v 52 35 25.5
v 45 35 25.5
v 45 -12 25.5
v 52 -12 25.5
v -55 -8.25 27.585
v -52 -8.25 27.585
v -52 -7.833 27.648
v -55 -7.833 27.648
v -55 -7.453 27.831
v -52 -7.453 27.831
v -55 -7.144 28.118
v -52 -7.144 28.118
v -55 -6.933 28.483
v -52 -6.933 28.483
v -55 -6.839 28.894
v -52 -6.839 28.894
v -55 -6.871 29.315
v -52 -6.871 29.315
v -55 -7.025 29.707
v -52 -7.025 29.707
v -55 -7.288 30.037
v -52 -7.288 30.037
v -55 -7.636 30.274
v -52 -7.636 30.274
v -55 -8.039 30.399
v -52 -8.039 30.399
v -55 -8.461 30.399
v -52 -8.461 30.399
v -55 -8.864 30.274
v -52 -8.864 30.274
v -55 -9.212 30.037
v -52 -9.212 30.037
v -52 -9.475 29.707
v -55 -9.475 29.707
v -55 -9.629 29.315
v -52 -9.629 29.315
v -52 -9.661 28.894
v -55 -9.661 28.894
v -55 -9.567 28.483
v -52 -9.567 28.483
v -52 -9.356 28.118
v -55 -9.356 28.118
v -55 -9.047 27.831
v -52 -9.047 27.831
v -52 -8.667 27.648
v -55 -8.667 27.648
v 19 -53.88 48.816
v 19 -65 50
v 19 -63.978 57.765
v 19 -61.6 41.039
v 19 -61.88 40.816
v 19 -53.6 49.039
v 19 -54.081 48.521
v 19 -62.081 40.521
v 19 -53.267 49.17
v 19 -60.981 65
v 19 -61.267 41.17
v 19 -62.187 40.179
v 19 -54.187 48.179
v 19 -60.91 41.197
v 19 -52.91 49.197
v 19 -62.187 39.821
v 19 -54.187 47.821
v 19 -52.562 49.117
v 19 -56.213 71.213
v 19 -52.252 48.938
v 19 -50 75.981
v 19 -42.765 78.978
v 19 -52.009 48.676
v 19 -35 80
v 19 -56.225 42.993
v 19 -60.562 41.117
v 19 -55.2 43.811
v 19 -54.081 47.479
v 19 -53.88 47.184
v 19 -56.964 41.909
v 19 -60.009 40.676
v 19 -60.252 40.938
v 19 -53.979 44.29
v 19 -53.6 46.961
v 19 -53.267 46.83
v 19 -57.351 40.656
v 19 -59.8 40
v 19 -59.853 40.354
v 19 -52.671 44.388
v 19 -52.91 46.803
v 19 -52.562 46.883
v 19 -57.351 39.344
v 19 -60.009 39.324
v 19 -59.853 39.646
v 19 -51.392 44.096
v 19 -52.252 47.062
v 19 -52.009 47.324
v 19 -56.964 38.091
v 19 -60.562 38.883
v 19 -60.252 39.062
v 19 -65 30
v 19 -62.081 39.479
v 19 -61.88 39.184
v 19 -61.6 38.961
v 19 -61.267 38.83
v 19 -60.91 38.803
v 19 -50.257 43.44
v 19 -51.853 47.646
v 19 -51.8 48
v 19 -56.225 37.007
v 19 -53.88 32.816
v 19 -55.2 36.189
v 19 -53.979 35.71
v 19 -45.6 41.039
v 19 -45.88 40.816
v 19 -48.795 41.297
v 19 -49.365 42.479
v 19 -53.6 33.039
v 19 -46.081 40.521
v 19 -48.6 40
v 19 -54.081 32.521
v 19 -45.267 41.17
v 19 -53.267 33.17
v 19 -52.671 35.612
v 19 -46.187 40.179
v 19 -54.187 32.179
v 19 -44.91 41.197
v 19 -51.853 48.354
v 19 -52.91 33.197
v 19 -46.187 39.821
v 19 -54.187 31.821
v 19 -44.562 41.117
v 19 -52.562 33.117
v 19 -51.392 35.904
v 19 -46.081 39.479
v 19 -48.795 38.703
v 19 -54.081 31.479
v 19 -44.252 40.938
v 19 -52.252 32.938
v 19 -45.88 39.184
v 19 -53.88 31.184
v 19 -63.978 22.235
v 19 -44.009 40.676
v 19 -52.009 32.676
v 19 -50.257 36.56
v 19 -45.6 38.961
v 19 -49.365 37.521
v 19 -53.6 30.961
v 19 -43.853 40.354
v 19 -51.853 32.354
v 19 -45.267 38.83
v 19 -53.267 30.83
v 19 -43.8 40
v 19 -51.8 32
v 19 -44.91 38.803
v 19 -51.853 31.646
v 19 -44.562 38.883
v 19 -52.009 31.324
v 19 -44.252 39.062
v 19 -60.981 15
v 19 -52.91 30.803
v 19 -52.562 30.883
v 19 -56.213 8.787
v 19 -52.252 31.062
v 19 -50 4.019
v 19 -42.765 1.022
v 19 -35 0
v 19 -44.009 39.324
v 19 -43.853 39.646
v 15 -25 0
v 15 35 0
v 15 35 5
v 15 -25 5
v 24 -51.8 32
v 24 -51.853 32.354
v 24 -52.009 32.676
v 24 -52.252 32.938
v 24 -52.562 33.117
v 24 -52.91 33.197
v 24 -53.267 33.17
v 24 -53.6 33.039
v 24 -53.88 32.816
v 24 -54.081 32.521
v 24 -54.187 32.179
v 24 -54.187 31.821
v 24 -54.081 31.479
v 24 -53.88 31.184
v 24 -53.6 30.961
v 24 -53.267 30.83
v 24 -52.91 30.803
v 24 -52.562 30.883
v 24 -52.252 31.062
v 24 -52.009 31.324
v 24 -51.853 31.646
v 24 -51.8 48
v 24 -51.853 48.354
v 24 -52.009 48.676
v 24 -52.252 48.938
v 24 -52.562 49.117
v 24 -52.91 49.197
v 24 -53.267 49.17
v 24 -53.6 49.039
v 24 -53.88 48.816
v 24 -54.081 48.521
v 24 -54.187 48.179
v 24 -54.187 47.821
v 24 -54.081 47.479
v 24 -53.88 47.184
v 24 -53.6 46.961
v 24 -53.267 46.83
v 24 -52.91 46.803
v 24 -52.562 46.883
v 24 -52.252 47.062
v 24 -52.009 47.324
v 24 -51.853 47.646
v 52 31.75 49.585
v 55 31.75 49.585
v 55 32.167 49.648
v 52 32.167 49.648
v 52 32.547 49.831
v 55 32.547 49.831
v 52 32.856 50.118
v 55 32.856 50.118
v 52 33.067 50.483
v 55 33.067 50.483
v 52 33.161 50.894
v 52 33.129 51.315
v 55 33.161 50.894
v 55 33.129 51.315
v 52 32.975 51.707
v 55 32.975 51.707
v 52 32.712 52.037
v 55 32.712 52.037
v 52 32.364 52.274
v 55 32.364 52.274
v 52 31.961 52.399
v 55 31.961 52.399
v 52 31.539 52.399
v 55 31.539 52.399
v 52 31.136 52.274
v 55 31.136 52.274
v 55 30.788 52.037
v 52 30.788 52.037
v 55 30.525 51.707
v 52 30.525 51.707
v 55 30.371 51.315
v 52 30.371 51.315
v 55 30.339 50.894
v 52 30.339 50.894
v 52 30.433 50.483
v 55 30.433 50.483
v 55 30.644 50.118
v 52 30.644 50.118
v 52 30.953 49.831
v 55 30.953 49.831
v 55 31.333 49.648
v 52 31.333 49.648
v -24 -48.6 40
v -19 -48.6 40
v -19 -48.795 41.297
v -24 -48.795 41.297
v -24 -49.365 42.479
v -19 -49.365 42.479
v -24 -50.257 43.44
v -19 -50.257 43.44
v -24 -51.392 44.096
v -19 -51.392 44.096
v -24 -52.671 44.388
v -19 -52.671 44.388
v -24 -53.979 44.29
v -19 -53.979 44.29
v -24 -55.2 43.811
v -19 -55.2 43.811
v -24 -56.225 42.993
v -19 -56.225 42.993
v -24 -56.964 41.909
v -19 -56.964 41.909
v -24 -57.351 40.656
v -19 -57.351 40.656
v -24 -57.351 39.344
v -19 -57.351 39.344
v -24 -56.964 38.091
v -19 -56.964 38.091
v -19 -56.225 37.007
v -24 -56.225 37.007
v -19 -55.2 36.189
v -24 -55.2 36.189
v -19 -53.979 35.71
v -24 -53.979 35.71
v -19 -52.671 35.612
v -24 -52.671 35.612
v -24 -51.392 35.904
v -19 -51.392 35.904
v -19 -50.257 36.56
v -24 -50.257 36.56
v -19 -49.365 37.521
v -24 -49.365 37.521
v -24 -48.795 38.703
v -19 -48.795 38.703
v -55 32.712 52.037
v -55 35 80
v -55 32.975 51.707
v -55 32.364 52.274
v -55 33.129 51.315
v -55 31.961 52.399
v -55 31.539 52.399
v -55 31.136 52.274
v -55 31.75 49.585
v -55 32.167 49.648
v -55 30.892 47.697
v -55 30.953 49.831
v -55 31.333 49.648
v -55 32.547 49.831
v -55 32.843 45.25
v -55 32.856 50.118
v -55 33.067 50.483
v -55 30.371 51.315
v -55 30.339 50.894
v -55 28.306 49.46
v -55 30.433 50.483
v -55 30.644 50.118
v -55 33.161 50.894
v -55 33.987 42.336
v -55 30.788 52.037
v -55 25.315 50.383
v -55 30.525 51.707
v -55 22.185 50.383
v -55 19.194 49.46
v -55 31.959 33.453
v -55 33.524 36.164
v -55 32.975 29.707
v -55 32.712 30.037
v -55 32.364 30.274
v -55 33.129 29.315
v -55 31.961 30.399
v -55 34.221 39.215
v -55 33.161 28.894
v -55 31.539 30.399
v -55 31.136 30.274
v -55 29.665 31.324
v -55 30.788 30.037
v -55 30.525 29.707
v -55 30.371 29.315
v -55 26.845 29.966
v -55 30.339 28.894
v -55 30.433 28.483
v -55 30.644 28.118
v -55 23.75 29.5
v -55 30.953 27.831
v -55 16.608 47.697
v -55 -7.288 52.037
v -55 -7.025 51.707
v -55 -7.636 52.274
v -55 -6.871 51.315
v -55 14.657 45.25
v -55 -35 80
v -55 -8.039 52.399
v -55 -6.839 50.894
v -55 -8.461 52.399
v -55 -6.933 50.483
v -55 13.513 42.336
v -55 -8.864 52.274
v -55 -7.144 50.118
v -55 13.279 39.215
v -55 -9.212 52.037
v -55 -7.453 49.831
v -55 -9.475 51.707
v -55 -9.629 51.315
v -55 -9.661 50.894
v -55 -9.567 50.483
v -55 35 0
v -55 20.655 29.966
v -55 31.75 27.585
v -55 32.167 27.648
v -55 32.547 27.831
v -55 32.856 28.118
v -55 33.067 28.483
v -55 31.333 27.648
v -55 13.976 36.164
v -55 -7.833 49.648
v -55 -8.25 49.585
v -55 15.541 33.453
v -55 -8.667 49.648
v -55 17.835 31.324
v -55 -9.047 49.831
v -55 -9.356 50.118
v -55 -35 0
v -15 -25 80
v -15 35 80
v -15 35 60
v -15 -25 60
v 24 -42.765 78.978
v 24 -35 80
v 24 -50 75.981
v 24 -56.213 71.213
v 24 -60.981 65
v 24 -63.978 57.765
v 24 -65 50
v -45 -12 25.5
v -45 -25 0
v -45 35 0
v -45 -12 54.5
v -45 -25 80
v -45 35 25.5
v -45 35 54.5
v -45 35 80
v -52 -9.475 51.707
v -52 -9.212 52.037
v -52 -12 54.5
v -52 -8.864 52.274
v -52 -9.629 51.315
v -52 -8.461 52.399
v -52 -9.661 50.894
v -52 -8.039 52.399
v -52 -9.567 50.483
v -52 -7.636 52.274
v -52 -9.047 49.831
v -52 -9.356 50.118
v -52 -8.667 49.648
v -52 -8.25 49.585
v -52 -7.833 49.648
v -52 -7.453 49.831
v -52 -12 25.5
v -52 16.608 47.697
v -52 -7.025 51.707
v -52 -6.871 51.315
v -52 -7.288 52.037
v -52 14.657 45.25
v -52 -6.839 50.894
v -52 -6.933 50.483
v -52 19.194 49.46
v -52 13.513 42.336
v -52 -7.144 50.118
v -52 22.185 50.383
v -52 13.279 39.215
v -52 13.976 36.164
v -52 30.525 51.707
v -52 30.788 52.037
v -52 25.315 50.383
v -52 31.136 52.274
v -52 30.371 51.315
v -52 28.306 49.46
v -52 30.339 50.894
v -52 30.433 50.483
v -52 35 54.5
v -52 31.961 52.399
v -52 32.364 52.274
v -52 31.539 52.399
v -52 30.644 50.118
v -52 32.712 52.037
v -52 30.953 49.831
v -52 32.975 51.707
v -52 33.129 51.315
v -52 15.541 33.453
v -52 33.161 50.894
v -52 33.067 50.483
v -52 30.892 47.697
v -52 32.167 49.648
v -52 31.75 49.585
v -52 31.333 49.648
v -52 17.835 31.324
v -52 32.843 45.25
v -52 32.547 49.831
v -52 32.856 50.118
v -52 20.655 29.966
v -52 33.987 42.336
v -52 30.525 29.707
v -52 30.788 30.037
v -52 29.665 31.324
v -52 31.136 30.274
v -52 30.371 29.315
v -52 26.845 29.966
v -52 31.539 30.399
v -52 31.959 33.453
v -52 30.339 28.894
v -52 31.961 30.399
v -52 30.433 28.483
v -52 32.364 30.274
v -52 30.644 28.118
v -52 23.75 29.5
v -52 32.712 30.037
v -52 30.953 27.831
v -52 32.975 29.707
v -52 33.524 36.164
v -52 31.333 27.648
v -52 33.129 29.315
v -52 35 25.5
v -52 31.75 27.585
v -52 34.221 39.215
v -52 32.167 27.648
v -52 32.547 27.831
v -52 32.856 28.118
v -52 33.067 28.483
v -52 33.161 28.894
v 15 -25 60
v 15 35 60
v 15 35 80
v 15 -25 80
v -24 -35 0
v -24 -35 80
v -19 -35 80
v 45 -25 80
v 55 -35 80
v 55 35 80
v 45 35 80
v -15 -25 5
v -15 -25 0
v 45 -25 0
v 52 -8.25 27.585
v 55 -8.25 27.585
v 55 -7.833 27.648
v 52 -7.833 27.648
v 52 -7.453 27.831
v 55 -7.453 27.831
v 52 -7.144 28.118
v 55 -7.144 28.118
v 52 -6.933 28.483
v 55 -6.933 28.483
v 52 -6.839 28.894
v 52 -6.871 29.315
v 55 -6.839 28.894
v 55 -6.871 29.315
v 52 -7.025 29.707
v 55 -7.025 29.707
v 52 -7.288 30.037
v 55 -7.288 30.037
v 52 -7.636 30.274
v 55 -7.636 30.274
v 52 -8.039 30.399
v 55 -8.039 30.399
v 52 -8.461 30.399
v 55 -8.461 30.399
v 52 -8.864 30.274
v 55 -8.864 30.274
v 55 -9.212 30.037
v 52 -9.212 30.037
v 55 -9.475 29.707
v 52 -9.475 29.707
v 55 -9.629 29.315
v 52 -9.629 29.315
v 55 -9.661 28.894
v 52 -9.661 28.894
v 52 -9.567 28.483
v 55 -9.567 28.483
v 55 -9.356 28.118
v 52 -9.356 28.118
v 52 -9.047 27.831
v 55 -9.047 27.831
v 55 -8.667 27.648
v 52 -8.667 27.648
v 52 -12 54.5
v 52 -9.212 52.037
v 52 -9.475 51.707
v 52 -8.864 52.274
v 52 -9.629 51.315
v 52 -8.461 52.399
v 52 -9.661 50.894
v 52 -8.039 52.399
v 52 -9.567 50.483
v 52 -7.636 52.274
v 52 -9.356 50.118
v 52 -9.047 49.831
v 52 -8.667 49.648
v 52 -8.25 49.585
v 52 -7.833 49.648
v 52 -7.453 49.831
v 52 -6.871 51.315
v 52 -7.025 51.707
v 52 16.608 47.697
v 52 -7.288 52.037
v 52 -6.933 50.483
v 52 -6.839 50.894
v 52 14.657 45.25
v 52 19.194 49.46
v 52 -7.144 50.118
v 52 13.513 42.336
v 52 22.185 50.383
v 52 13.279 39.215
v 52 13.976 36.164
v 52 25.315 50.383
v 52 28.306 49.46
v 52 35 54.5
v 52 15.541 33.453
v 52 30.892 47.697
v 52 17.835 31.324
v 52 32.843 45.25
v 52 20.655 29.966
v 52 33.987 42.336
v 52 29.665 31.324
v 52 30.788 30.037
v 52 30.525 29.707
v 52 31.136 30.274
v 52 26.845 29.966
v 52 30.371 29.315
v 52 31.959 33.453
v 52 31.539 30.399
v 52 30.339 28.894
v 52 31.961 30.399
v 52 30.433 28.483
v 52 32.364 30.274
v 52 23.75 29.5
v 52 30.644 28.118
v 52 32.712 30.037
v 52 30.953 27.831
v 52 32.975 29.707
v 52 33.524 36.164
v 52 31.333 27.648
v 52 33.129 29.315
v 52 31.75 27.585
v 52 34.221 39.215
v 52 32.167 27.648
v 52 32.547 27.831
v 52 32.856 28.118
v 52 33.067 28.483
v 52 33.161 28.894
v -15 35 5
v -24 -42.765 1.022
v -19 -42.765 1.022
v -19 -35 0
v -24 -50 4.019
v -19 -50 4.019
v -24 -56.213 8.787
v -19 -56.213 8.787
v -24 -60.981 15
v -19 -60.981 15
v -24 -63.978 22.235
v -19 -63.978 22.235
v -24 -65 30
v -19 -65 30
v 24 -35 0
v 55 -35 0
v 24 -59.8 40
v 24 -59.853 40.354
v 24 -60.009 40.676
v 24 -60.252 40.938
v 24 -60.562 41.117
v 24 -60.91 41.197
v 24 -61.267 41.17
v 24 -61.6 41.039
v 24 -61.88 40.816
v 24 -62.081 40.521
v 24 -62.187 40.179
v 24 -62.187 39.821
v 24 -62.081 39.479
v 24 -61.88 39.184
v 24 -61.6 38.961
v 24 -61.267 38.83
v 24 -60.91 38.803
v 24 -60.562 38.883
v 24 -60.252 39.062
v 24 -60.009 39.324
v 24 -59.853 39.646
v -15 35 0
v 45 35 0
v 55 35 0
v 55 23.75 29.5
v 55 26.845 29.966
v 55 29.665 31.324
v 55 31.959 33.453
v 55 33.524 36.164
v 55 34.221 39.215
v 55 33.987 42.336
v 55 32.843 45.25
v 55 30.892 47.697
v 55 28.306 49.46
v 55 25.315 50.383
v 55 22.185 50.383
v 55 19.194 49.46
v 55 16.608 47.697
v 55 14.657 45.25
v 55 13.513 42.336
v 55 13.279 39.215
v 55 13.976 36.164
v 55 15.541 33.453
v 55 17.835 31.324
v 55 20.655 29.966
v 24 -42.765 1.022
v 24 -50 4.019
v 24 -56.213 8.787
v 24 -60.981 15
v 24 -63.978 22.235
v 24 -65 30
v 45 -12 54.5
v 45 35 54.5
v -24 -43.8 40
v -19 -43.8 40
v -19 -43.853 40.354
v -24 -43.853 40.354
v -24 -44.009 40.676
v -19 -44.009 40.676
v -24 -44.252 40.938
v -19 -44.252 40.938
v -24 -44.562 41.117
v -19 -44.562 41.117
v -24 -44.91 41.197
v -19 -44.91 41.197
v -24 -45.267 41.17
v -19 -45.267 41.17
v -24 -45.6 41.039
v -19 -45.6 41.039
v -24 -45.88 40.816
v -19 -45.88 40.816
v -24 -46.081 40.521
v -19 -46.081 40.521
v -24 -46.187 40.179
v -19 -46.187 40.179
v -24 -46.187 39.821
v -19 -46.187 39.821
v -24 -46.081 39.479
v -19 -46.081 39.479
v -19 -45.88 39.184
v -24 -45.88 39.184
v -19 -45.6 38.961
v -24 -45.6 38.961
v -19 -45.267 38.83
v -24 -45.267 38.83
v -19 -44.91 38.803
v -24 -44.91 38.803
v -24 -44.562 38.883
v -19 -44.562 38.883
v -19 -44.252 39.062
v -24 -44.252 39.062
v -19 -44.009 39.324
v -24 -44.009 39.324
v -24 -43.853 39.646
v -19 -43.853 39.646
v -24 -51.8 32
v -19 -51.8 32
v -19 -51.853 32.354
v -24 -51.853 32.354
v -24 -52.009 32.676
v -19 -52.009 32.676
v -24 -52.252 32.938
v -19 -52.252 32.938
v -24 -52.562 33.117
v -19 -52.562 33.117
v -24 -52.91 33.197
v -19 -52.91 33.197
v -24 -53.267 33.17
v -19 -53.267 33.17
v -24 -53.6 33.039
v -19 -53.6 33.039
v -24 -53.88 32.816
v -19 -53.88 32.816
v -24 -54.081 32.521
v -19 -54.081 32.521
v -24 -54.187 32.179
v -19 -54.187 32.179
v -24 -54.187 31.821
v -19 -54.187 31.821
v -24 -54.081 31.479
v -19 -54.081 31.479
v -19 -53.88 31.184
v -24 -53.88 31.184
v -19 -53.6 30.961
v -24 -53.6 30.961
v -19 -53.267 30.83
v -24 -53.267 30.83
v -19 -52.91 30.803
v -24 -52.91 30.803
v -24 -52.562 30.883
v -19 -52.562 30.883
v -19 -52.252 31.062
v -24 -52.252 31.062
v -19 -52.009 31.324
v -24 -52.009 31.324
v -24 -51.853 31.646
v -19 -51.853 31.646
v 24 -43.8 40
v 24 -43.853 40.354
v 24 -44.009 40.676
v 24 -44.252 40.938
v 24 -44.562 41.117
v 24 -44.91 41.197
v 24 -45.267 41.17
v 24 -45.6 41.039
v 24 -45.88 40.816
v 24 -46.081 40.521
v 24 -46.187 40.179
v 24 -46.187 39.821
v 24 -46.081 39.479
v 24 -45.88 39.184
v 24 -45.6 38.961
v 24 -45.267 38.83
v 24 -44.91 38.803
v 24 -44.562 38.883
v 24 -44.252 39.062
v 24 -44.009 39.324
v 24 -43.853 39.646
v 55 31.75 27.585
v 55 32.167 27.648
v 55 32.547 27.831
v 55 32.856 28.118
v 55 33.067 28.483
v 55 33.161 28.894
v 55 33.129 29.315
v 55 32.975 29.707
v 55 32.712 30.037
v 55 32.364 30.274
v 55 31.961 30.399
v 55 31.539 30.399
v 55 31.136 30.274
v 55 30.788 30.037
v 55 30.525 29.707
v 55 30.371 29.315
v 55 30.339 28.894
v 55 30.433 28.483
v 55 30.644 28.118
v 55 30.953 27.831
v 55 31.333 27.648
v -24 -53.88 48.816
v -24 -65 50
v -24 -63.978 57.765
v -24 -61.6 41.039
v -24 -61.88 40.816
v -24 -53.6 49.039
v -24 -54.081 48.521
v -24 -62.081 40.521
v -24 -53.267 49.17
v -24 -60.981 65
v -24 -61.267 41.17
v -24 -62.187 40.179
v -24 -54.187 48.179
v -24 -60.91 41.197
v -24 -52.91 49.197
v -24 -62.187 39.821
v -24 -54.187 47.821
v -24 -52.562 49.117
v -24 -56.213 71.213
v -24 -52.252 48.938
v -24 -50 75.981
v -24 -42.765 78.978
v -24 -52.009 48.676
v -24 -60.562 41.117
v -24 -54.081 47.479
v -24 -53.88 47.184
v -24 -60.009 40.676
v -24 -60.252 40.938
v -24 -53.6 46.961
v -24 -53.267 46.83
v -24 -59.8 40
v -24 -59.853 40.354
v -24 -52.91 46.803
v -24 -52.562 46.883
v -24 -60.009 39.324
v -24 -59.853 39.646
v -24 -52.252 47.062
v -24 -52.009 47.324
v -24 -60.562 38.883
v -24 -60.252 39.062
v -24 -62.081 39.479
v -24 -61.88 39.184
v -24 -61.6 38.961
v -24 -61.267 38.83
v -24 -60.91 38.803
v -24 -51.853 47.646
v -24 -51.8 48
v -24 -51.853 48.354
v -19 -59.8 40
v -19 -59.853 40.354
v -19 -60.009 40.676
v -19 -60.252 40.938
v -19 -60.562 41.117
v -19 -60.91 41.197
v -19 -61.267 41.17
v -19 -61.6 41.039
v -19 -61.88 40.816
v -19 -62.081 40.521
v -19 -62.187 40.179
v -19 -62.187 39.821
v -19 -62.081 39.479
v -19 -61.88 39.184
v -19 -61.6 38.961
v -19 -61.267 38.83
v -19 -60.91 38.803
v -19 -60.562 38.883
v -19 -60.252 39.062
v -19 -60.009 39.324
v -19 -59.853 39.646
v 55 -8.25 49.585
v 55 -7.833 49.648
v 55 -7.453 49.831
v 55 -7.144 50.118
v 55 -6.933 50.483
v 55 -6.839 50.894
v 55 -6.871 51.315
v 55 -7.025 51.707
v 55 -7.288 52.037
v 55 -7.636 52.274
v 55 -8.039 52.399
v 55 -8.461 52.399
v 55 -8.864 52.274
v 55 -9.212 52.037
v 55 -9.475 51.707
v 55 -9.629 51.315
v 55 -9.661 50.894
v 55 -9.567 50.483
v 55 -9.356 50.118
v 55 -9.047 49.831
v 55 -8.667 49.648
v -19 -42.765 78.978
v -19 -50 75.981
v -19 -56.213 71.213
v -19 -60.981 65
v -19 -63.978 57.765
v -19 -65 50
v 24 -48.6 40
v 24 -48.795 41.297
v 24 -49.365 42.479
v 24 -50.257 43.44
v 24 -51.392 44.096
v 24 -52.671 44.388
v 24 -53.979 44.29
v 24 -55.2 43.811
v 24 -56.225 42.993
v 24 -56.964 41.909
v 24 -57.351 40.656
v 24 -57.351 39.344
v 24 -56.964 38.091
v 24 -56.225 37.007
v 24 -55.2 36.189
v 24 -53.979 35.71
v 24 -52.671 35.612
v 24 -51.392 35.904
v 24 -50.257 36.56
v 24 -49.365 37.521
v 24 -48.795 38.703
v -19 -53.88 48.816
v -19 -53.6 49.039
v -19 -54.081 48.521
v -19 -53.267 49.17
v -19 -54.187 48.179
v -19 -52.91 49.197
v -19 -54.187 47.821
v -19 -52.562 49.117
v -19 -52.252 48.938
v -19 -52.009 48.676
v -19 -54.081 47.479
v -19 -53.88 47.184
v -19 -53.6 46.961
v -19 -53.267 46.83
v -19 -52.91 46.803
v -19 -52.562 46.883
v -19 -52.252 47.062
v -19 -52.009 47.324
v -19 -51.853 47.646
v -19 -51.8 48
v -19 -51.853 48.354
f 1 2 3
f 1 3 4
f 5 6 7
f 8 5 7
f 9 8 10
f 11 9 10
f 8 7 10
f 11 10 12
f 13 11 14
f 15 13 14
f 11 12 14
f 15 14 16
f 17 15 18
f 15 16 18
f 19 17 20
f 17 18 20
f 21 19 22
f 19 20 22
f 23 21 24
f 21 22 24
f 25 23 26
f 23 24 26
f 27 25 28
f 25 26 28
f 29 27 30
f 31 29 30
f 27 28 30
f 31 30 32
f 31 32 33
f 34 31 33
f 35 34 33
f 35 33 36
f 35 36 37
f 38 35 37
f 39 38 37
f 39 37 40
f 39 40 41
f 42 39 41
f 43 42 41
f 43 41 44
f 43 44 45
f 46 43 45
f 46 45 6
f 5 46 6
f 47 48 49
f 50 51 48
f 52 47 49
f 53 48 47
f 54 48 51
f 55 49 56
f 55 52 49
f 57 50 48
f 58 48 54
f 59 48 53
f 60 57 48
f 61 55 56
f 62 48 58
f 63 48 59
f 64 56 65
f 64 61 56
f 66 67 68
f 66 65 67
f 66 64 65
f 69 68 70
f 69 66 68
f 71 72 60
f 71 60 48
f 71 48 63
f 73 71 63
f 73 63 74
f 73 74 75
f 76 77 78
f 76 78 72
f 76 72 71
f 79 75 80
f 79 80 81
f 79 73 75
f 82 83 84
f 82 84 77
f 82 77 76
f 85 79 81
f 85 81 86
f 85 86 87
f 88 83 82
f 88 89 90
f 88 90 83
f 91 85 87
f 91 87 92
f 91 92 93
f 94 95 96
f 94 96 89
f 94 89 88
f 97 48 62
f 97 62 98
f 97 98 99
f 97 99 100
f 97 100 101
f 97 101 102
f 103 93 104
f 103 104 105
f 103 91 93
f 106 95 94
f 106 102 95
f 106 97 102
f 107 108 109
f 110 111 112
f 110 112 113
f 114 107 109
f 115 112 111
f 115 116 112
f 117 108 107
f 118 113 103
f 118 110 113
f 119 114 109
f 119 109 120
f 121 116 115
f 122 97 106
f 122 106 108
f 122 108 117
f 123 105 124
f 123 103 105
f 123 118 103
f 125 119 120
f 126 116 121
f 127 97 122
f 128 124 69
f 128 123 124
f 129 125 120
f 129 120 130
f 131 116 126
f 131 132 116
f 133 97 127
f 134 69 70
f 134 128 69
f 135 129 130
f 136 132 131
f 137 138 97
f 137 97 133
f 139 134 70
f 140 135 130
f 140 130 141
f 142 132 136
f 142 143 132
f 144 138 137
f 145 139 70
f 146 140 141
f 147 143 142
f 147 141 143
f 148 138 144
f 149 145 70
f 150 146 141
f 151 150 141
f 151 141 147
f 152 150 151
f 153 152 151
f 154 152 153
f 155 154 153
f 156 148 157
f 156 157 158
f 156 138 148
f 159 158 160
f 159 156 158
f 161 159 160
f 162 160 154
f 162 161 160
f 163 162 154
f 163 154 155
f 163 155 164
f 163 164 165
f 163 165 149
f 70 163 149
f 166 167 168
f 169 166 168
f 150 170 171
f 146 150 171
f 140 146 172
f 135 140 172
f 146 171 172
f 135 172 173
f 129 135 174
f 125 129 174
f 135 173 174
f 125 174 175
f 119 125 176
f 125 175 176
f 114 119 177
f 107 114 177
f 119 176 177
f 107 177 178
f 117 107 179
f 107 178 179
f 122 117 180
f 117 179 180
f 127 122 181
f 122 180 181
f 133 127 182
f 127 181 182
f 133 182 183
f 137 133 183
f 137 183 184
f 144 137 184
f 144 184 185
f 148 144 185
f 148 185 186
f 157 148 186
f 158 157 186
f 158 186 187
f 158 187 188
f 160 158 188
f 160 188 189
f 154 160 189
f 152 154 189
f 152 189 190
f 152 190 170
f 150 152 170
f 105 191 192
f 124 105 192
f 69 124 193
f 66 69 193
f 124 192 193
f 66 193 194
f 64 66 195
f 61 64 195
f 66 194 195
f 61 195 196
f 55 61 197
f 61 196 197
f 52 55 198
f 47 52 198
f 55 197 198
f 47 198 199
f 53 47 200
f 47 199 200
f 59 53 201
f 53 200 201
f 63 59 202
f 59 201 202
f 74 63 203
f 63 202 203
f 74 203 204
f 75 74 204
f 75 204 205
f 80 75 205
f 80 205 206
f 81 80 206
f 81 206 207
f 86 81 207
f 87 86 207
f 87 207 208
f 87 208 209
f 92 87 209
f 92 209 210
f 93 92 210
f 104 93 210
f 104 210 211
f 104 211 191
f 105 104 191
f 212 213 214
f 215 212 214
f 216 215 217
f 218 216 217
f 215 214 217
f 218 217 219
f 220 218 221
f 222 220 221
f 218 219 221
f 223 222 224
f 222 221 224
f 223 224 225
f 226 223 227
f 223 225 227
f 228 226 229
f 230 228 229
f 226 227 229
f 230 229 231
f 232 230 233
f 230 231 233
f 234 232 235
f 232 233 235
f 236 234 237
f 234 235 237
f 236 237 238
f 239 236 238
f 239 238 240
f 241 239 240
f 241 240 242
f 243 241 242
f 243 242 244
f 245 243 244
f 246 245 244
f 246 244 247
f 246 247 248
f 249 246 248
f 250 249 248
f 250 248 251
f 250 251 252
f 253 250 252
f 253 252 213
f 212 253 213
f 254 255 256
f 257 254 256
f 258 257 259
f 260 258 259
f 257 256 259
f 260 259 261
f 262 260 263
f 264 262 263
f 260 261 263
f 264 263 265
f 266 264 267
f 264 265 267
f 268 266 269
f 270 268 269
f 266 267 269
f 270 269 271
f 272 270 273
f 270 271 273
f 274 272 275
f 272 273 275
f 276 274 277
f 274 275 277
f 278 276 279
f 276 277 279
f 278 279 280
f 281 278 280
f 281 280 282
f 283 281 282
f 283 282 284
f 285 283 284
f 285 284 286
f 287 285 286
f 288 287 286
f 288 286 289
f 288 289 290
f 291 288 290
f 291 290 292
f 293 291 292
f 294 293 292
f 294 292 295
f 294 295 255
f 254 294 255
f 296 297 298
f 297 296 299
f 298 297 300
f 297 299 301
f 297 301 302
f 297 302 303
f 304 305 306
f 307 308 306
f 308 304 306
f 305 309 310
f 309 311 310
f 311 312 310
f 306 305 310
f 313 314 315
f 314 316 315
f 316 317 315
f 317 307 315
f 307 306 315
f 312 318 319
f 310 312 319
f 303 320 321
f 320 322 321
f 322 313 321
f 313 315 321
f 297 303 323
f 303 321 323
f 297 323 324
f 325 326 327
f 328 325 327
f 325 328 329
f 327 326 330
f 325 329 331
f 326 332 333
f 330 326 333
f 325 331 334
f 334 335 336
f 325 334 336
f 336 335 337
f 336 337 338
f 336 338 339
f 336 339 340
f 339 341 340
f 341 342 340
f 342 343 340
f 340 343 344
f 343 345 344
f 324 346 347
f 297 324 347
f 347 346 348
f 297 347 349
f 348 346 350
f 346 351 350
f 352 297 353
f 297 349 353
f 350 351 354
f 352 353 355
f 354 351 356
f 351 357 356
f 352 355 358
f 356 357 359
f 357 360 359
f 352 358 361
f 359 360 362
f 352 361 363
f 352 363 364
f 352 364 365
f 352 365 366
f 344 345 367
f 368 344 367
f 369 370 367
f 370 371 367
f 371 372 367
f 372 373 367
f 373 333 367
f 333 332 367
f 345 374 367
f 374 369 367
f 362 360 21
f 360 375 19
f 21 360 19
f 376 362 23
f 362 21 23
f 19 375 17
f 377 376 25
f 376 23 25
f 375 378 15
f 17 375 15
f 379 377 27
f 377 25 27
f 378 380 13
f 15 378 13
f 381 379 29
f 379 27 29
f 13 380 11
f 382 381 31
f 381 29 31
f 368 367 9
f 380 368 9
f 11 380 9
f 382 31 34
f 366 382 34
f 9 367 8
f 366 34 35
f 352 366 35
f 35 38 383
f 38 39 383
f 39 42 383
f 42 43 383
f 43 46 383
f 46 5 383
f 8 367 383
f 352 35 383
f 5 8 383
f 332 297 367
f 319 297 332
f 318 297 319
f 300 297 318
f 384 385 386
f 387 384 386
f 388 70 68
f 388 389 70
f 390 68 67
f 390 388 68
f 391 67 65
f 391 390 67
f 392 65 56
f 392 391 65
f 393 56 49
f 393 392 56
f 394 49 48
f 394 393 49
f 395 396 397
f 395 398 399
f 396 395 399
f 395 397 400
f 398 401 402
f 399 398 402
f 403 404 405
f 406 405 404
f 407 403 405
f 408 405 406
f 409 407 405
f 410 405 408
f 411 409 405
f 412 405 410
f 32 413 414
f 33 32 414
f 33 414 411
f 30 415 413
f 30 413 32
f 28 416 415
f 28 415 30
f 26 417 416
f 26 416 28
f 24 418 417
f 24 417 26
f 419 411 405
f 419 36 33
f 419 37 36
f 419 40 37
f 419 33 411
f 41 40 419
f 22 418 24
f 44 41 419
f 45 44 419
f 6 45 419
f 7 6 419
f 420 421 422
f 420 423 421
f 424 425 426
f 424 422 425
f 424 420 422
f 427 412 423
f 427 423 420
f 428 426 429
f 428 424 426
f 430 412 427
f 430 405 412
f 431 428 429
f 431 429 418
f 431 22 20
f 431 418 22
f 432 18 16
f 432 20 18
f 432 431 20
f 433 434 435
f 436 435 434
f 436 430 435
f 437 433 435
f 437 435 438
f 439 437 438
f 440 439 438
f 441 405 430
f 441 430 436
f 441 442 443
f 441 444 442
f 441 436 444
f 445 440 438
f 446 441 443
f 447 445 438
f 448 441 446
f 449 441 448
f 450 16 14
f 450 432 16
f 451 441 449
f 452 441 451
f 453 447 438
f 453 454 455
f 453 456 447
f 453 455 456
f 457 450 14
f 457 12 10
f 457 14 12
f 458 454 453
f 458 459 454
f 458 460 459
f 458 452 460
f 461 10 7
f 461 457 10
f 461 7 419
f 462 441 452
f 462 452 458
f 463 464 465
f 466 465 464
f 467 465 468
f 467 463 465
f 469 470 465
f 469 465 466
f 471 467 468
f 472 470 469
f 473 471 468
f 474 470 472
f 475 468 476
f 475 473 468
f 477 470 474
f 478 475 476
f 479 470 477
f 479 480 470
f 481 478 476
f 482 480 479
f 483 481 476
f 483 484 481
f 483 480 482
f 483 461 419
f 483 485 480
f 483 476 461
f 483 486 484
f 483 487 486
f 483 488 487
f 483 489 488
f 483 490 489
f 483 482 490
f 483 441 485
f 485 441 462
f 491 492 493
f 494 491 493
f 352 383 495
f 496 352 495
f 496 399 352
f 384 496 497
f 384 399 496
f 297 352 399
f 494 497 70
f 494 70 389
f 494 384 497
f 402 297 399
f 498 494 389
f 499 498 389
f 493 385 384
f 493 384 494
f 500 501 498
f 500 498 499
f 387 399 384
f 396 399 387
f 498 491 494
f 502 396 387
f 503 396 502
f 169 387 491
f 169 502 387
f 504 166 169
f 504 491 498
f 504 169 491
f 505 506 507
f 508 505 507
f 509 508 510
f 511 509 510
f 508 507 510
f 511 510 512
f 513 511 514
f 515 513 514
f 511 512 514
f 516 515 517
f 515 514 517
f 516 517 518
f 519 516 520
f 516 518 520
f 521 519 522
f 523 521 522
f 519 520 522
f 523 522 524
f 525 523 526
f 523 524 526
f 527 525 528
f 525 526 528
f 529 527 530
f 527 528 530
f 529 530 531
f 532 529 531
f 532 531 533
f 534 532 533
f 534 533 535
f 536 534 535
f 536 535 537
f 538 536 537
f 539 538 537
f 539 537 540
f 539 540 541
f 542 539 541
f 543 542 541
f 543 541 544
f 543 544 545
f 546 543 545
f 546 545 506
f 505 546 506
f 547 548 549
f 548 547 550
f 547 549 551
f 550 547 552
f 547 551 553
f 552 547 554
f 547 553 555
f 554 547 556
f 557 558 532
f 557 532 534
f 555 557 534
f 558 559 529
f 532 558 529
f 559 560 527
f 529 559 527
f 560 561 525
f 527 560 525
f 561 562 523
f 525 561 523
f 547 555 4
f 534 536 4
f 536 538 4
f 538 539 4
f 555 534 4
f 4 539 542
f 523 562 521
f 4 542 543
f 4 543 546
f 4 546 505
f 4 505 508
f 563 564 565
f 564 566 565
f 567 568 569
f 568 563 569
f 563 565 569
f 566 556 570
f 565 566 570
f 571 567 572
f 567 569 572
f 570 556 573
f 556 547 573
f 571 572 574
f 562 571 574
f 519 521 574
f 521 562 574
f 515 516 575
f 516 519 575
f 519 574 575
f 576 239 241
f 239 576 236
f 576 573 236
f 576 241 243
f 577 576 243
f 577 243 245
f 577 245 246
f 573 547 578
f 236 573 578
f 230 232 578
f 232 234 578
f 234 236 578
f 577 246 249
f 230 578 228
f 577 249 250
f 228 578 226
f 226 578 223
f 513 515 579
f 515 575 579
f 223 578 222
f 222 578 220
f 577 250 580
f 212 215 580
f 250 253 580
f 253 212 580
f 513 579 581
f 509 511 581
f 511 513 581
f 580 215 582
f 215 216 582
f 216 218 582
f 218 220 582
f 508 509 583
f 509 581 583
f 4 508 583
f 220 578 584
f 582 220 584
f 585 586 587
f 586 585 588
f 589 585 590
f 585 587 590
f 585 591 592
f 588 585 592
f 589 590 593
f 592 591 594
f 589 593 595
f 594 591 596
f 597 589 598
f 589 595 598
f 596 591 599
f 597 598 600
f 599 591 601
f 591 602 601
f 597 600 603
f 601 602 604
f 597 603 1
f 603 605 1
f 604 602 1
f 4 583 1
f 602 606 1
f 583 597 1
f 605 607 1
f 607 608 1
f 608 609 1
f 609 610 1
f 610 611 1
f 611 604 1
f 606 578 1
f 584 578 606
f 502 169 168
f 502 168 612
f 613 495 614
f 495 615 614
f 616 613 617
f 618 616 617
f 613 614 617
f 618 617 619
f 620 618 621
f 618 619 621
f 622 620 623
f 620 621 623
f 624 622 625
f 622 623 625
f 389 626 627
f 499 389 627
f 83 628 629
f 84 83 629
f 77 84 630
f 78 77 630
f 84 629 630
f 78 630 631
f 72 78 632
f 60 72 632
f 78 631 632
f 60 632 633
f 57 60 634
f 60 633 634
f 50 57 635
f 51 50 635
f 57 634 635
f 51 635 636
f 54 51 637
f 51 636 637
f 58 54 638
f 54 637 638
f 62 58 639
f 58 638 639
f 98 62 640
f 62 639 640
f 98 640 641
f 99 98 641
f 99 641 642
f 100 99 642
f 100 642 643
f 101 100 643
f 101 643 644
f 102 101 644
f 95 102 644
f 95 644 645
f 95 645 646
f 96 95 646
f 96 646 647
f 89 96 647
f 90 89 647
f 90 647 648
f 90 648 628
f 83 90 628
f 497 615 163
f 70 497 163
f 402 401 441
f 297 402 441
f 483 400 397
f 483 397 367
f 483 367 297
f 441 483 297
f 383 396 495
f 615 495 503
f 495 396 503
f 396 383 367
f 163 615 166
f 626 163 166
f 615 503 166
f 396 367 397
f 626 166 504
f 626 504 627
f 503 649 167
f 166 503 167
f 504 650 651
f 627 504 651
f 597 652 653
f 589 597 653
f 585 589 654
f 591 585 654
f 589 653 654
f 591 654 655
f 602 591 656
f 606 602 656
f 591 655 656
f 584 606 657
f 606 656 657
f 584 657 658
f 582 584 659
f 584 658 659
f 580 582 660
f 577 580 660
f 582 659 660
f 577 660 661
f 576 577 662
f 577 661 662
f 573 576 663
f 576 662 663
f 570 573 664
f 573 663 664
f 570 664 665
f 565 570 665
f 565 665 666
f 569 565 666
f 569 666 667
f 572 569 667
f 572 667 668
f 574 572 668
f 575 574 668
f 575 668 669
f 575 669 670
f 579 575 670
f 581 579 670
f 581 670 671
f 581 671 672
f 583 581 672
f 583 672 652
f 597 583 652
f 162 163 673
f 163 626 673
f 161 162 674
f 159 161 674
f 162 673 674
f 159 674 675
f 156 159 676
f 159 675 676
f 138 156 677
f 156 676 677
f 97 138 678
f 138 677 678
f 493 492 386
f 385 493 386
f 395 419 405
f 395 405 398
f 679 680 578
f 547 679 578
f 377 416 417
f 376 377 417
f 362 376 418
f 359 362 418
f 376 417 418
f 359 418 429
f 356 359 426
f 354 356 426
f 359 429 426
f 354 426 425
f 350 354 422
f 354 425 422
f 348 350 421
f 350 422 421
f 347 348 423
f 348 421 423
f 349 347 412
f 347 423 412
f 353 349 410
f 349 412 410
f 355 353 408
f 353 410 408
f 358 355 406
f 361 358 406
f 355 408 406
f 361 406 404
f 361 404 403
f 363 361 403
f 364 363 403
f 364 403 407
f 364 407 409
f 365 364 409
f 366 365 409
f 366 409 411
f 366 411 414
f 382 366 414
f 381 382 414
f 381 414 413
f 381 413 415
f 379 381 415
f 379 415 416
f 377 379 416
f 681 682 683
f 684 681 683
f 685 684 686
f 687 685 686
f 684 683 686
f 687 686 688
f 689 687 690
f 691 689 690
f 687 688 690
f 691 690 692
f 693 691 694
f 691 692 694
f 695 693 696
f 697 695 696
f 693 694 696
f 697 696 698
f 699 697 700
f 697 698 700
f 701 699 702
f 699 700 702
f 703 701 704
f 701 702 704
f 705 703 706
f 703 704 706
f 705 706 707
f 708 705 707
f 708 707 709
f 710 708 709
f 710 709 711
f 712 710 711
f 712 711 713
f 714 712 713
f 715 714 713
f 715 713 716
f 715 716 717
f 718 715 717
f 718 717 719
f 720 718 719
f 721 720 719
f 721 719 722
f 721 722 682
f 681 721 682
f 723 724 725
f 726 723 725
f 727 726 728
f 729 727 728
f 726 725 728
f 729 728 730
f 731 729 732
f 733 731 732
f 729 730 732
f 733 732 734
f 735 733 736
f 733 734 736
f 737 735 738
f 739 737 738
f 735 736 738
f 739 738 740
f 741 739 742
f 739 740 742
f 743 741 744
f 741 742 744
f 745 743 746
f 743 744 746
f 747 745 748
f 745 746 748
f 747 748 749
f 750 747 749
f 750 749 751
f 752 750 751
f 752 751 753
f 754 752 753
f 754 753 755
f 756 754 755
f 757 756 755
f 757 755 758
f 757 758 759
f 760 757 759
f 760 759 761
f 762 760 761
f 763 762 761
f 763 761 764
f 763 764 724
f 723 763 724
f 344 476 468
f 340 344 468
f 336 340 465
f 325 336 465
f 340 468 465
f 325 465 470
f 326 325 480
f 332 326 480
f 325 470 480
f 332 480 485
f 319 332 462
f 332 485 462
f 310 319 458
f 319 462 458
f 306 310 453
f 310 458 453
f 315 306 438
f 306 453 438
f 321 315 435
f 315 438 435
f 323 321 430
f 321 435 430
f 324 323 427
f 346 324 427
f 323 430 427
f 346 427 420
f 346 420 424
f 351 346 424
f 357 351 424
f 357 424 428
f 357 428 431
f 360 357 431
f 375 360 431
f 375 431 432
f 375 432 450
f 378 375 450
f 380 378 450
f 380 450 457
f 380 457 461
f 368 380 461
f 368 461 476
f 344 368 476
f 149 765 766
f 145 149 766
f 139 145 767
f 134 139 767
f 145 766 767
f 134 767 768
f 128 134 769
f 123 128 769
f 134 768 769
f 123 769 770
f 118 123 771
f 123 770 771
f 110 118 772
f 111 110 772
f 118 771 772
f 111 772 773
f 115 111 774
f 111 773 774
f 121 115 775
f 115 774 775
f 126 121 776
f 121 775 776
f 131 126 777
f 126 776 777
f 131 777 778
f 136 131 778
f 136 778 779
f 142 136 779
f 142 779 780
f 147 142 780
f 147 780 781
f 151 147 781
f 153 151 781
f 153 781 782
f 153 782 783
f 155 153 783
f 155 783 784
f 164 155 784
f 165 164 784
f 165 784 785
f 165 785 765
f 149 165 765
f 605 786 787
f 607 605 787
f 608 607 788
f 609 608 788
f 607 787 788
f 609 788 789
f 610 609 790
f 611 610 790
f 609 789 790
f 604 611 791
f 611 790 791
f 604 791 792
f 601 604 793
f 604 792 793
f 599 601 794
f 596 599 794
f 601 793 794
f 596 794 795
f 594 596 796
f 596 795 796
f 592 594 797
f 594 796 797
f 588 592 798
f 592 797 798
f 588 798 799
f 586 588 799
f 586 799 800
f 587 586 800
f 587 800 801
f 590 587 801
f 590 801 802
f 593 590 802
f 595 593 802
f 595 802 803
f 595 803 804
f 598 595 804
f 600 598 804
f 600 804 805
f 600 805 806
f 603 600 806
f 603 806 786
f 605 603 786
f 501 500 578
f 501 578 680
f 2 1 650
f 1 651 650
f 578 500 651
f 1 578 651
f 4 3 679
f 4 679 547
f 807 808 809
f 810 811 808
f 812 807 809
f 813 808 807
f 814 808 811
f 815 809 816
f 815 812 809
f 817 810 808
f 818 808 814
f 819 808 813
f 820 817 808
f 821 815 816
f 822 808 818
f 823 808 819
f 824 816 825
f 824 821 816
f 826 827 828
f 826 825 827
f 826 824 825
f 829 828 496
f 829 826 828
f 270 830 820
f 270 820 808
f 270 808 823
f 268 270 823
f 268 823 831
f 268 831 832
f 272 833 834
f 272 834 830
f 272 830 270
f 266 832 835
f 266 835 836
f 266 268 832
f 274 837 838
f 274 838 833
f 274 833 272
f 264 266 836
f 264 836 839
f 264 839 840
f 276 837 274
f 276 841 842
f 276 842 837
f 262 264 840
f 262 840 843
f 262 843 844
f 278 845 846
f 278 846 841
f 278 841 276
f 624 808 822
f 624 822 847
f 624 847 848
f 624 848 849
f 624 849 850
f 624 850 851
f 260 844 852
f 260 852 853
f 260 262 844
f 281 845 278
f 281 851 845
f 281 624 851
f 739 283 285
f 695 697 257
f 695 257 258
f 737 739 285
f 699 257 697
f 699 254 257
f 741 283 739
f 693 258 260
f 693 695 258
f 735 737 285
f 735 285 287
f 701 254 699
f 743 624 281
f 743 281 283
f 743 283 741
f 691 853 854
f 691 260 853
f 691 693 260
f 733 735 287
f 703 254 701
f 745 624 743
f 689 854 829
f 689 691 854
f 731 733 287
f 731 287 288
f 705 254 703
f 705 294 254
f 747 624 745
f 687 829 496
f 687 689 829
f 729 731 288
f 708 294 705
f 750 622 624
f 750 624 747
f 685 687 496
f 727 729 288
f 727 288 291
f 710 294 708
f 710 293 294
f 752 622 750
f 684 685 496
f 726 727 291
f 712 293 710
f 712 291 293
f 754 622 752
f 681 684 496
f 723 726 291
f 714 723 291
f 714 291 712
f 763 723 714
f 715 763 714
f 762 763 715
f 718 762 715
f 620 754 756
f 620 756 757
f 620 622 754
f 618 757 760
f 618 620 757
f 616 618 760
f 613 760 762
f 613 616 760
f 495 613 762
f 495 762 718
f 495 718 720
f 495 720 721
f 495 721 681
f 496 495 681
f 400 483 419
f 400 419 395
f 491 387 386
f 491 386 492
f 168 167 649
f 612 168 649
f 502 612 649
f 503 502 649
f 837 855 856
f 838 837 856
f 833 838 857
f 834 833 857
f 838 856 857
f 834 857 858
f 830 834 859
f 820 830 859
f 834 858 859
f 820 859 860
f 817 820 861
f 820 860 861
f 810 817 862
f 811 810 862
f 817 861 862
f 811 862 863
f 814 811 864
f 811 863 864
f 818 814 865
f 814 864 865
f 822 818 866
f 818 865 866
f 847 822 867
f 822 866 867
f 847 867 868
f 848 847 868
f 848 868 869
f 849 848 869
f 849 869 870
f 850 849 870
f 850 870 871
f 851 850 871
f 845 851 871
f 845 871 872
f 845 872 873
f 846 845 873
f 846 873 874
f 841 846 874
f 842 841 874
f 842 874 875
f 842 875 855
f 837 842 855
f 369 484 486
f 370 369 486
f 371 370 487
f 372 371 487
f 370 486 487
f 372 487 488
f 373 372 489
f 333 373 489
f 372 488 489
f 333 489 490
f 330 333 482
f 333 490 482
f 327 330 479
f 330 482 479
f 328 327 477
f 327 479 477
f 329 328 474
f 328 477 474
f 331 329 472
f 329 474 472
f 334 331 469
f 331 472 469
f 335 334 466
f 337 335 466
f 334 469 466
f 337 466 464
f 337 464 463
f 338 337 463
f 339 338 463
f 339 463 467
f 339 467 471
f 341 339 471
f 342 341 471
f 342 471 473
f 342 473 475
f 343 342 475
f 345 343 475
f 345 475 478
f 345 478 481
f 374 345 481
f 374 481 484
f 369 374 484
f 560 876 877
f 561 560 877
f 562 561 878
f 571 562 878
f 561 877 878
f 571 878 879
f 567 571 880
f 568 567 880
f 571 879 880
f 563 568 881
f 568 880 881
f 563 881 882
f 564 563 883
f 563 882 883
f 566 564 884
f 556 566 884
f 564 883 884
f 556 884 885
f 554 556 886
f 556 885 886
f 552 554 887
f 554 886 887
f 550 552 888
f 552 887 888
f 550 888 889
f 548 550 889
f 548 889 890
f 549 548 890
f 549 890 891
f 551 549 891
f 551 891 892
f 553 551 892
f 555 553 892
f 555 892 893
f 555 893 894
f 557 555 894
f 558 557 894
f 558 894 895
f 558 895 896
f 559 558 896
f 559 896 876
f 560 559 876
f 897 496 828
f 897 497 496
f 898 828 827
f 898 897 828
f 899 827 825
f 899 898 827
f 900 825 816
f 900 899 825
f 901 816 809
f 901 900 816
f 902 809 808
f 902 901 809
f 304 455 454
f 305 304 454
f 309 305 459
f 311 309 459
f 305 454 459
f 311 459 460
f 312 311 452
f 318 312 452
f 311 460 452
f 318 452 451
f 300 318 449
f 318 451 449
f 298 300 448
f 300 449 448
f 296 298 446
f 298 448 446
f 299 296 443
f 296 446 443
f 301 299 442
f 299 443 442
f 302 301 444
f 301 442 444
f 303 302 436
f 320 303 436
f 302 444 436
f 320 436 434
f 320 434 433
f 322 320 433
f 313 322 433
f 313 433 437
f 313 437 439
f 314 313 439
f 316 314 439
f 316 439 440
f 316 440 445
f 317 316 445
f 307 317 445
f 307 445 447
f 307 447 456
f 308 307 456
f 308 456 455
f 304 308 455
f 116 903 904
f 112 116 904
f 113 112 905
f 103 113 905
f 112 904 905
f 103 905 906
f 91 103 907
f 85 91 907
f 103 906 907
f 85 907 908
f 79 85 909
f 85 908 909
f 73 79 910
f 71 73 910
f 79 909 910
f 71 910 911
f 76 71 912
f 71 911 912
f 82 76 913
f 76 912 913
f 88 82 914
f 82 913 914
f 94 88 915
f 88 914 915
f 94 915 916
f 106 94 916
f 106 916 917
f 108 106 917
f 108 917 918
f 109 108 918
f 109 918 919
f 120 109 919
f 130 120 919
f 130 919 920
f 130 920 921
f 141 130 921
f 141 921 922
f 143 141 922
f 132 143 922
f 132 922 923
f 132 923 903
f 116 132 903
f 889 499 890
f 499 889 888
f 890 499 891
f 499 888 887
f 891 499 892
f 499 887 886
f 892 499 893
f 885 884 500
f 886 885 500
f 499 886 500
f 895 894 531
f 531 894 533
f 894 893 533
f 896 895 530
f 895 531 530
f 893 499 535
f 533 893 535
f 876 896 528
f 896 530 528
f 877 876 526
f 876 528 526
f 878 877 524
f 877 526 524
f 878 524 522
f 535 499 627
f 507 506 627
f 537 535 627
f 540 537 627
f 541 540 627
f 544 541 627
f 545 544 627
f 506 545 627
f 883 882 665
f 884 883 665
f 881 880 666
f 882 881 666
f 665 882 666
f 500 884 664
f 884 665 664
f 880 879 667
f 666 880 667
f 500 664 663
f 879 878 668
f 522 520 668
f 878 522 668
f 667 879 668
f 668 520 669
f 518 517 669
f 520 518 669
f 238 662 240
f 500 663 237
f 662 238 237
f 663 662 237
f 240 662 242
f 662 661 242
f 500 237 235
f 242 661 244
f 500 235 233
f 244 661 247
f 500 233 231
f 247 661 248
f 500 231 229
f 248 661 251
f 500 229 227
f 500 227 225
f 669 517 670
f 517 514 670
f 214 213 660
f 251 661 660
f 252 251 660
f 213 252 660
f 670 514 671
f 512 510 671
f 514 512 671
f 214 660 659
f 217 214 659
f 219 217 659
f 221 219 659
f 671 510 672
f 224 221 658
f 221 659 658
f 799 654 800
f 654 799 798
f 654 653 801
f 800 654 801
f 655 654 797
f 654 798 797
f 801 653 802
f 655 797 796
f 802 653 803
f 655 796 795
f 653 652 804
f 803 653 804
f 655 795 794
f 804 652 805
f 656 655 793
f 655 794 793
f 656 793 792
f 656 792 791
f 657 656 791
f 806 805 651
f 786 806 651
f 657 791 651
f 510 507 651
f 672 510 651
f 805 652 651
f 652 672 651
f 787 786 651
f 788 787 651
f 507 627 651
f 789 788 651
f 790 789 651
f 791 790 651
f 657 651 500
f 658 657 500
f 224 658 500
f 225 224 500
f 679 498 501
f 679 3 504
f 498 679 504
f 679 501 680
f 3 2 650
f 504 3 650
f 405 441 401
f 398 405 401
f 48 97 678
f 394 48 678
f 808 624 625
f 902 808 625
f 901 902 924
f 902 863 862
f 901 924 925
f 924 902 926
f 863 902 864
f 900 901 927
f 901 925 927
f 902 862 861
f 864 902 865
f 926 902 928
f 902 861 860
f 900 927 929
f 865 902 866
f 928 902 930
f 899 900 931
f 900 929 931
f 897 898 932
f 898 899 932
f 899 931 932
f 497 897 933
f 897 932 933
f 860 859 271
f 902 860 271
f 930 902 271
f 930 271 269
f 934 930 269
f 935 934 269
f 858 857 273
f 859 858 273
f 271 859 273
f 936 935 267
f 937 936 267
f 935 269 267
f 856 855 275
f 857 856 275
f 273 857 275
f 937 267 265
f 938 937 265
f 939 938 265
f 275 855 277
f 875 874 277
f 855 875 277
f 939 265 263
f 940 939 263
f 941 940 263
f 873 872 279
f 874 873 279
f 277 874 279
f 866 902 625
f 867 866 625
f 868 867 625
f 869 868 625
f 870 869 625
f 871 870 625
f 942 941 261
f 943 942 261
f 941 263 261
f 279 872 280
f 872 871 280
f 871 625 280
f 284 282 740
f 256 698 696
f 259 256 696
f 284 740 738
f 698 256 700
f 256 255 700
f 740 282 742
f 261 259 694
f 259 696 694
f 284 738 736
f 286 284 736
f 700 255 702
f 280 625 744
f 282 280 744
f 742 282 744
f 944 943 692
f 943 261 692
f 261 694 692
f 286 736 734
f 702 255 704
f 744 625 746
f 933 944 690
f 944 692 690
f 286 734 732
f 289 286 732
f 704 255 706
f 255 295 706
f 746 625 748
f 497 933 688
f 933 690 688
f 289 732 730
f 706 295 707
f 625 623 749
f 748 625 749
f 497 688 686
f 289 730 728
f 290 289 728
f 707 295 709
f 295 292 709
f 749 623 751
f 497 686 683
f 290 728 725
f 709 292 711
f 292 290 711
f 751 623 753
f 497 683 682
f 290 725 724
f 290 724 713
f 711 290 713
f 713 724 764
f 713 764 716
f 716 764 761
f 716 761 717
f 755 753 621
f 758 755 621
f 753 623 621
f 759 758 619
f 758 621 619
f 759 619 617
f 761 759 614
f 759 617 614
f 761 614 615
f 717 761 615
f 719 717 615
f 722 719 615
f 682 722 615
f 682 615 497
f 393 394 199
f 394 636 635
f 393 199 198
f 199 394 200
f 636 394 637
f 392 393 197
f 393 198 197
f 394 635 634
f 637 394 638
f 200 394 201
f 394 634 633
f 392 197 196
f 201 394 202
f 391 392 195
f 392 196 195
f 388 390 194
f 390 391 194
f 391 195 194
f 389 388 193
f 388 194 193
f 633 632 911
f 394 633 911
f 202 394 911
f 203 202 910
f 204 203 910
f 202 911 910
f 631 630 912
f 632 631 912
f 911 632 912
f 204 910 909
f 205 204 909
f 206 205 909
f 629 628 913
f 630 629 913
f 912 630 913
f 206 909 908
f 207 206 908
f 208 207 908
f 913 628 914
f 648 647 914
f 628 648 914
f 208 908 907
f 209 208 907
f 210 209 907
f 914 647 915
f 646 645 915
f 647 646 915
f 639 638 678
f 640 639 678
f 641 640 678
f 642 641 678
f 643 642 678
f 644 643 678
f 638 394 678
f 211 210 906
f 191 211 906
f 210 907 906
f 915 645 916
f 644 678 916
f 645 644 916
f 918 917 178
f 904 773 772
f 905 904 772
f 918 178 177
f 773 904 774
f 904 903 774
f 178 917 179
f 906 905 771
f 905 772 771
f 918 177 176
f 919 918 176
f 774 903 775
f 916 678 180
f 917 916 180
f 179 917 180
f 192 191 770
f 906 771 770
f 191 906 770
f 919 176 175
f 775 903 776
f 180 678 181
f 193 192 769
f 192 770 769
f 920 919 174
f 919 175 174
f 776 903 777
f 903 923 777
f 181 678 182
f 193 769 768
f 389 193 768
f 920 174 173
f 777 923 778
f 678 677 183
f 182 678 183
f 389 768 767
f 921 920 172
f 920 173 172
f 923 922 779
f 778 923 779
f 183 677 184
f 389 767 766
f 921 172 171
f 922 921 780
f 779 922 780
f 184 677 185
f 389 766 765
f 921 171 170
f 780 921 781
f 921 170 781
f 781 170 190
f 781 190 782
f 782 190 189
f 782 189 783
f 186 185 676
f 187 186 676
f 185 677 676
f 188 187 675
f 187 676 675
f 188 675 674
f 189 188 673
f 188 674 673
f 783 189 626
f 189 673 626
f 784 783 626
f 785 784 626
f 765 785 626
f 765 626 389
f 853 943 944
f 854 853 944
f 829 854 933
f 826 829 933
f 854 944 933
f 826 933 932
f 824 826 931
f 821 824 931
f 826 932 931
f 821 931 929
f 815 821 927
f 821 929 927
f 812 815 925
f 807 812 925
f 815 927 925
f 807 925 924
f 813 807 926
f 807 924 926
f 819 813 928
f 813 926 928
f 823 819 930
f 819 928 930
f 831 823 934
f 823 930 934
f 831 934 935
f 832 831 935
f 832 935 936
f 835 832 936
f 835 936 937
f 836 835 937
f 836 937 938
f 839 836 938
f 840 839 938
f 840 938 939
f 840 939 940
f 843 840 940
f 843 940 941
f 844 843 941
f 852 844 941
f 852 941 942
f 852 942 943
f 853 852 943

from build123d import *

# Parameters (mm, degrees)
SKETCH1_W           = 5
SKETCH1_H           = 30
BOSS_EXTRUDE1_DEPTH = 80
SKETCH2_R           = 1.2
SKETCH2_R_2         = 4.4
CUT_EXTRUDE1_DEPTH  = 80
CUT_EXTRUDE3_DEPTH  = 60
FILLET1_R           = 30
SKETCH6_R           = 10.5
SKETCH6_R_2         = 1.41450308
CUT_EXTRUDE4_DEPTH  = 151.748134317
SKETCH8_W           = 7
SKETCH8_H           = 29
CUT_EXTRUDE5_DEPTH  = 47


with BuildPart() as part:
    # Sketch1 → Boss-Extrude1 (new body)
    with BuildSketch(Plane.XY):
        Polygon((55, 35), (-55, 35), (-55, -35), (-24, -35), (-19, -35), (19, -35), (24, -35), (55, -35), align=None)
        with Locations((-21.5, -50)):
            Rectangle(SKETCH1_W, SKETCH1_H)
        with Locations((21.5, -50)):
            Rectangle(SKETCH1_W, SKETCH1_H)
    extrude(amount=BOSS_EXTRUDE1_DEPTH)

    # Sketch2 → Cut-Extrude1 (cut)
    with BuildSketch(Plane(origin=(24, 0, 0), x_dir=(0, 0, -1), z_dir=(1, 0, 0))):
        with Locations(Location((-40, -45, 0), (0, 0, 90))):
            Circle(SKETCH2_R)
        with Locations(Location((-32, -53, 0), (0, 0, 90))):
            Circle(SKETCH2_R)
        with Locations(Location((-40, -61, 0), (0, 0, 90))):
            Circle(SKETCH2_R)
        with Locations(Location((-48, -53, 0), (0, 0, 90))):
            Circle(SKETCH2_R)
        with Locations(Location((-40, -53, 0), (0, 0, 90))):
            Circle(SKETCH2_R_2)
    extrude(amount=-CUT_EXTRUDE1_DEPTH, mode=Mode.SUBTRACT)

    # Sketch4 → Cut-Extrude3 (cut)
    with BuildSketch(Plane(origin=(0, 35, 0), x_dir=(1, 0, 0), z_dir=(0, 1, 0))):
        Polygon((-45, 0), (-45, -80), (-15, -80), (-15, -60), (15, -60), (15, -80), (45, -80), (45, 0), (15, 0), (15, -5), (-15, -5), (-15, 0), align=None)
    extrude(amount=-CUT_EXTRUDE3_DEPTH, mode=Mode.SUBTRACT)

    # Fillet1
    fillet1_edges = [part.edges().sort_by_distance(p)[0] for p in [
        (-21.5, -65, 0),
        (-21.5, -65, 80),
        (21.5, -65, 0),
        (21.5, -65, 80),
    ]]
    fillet(fillet1_edges, radius=FILLET1_R)

    # Sketch6 → Cut-Extrude4 (cut, through all)
    with BuildSketch(Plane(origin=(55, 0, 0), x_dir=(0, 0, -1), z_dir=(1, 0, 0))):
        with Locations((-40, 23.75)):
            Circle(SKETCH6_R)
        with Locations((-51, 31.75)):
            Circle(SKETCH6_R_2)
        with Locations((-29, 31.75)):
            Circle(SKETCH6_R_2)
        with Locations((-51, -8.25)):
            Circle(SKETCH6_R_2)
        with Locations((-29, -8.25)):
            Circle(SKETCH6_R_2)
    extrude(amount=-CUT_EXTRUDE4_DEPTH, mode=Mode.SUBTRACT)

    # Sketch8 → Cut-Extrude5 (cut)
    with BuildSketch(Plane(origin=(0, 35, 0), x_dir=(1, 0, 0), z_dir=(0, 1, 0))):
        with Locations((-48.5, -40)):
            Rectangle(SKETCH8_W, SKETCH8_H)
        with Locations((48.5, -40)):
            Rectangle(SKETCH8_W, SKETCH8_H)
    extrude(amount=-CUT_EXTRUDE5_DEPTH, mode=Mode.SUBTRACT)


solid = part.part
